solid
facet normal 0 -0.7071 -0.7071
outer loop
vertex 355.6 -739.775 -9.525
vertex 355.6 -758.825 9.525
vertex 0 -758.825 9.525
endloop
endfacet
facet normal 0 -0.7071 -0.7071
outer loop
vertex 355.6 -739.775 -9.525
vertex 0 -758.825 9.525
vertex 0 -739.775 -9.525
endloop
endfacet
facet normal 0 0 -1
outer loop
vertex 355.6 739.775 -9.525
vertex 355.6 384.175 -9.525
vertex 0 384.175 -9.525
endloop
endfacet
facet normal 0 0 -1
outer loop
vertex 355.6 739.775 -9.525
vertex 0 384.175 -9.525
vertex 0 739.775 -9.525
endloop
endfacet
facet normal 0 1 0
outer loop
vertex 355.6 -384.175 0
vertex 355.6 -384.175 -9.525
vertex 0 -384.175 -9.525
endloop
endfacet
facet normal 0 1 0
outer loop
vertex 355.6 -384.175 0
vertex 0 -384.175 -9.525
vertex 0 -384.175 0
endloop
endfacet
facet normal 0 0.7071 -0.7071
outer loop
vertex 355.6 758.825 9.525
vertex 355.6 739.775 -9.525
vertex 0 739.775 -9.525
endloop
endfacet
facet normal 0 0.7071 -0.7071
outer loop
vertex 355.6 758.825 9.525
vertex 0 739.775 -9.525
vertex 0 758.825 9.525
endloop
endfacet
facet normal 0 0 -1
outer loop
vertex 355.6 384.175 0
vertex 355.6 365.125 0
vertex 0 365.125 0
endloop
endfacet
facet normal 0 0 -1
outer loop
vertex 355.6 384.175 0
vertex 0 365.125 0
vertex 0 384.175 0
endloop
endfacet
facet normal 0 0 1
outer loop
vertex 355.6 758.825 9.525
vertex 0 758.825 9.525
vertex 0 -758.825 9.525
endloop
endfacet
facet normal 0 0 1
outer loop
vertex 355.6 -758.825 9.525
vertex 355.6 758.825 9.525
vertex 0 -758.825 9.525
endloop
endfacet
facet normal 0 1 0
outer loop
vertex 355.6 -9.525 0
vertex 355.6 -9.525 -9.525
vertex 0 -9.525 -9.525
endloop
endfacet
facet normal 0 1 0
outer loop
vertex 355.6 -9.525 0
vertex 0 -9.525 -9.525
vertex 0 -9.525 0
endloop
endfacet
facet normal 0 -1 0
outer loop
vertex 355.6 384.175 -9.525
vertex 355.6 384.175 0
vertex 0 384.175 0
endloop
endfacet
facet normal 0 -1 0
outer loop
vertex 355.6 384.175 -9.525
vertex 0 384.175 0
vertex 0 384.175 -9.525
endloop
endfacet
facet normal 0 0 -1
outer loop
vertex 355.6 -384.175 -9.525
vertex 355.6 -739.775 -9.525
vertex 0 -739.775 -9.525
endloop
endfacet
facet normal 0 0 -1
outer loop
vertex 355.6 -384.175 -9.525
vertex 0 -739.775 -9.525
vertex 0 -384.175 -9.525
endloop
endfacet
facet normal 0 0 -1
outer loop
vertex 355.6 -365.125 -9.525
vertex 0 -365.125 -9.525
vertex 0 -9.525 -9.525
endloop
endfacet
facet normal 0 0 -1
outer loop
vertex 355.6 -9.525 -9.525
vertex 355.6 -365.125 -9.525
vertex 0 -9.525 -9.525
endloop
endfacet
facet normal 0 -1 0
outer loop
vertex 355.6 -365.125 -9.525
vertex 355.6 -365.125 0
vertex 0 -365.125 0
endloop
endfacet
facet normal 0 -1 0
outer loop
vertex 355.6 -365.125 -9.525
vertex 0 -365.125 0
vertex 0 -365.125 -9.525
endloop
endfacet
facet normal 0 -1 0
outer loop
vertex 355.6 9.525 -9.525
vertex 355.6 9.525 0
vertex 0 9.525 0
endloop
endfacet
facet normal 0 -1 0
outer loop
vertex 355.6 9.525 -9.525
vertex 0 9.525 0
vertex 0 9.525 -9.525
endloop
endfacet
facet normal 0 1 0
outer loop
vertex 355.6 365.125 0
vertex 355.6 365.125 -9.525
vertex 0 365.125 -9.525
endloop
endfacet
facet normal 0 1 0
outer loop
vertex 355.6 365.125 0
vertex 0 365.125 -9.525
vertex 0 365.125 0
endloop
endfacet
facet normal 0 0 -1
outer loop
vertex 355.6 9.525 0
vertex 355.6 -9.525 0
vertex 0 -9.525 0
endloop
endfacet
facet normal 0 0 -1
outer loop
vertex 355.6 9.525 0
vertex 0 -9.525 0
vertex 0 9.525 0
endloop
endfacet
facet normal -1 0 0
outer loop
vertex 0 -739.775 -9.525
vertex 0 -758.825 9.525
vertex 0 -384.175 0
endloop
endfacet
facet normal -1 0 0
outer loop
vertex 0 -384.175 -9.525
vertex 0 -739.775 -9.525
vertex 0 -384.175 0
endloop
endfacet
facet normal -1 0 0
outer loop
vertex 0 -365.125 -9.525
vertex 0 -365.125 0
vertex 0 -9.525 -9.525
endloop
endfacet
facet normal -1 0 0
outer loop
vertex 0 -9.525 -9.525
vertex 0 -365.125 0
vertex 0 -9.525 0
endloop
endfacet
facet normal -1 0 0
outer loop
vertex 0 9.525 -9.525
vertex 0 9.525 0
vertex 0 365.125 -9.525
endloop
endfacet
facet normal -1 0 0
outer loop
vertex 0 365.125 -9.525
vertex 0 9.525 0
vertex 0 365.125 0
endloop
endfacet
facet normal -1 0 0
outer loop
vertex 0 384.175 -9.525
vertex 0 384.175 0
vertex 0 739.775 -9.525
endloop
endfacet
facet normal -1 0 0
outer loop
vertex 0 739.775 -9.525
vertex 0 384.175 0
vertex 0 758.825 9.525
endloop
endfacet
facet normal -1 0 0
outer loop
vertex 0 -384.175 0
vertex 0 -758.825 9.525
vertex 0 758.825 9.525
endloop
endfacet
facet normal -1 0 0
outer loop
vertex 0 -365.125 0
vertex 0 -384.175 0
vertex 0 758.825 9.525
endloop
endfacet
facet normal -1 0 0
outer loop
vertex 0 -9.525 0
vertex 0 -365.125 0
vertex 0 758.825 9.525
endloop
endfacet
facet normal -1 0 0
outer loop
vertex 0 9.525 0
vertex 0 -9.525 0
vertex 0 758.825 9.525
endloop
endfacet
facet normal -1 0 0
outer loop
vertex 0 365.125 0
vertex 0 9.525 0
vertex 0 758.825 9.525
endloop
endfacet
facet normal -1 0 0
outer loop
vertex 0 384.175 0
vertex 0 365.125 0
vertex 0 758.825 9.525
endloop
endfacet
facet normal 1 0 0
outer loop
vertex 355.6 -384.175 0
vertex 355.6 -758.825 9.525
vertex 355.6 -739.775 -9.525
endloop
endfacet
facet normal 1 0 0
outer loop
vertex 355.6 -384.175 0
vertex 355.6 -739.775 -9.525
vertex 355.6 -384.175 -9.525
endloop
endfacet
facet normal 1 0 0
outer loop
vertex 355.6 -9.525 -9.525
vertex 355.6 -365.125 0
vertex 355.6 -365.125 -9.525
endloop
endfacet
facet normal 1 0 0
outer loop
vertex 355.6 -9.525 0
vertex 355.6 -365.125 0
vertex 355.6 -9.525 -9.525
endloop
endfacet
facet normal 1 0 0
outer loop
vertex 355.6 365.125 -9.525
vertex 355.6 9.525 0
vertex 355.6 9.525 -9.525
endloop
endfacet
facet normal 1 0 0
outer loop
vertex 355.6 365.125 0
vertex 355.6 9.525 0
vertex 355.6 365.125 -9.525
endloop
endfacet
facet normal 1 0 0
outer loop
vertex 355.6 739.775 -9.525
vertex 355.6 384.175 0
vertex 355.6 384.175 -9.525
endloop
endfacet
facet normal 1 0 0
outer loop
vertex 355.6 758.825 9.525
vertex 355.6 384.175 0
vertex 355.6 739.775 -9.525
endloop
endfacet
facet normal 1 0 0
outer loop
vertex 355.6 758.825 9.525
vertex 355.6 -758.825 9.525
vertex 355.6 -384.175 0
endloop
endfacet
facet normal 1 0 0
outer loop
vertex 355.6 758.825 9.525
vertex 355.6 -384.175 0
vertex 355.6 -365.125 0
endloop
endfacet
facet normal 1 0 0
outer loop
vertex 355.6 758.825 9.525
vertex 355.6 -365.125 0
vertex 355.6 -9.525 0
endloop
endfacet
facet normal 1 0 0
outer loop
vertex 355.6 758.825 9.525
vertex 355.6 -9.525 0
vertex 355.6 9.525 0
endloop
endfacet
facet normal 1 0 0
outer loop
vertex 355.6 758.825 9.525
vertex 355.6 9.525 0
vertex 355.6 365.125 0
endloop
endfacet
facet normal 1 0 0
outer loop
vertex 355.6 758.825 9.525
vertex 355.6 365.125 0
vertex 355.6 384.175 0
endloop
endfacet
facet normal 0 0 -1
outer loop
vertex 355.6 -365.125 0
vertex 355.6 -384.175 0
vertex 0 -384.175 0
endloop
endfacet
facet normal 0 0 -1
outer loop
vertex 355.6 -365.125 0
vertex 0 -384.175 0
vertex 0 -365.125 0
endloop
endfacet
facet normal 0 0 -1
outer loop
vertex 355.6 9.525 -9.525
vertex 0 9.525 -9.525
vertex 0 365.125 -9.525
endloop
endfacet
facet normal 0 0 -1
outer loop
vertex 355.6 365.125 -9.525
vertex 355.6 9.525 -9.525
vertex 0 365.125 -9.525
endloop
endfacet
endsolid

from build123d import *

# Parameters (mm, degrees)
F1_DEPTH = 355.6


with BuildPart() as f1:
    # F0 (on Right) → F1 (new body)
    with BuildSketch(Plane.YZ):
        Polygon((739.775, -9.525), (758.825, 9.525), (-758.825, 9.525), (-739.775, -9.525), (-384.175, -9.525), (-384.175, 0), (-365.125, 0), (-365.125, -9.525), (-9.525, -9.525), (-9.525, 0), (0, 0), (9.525, 0), (9.525, -9.525), (365.125, -9.525), (365.125, 0), (384.175, 0), (384.175, -9.525), align=None)
    extrude(amount=F1_DEPTH)


solid = f1.part
